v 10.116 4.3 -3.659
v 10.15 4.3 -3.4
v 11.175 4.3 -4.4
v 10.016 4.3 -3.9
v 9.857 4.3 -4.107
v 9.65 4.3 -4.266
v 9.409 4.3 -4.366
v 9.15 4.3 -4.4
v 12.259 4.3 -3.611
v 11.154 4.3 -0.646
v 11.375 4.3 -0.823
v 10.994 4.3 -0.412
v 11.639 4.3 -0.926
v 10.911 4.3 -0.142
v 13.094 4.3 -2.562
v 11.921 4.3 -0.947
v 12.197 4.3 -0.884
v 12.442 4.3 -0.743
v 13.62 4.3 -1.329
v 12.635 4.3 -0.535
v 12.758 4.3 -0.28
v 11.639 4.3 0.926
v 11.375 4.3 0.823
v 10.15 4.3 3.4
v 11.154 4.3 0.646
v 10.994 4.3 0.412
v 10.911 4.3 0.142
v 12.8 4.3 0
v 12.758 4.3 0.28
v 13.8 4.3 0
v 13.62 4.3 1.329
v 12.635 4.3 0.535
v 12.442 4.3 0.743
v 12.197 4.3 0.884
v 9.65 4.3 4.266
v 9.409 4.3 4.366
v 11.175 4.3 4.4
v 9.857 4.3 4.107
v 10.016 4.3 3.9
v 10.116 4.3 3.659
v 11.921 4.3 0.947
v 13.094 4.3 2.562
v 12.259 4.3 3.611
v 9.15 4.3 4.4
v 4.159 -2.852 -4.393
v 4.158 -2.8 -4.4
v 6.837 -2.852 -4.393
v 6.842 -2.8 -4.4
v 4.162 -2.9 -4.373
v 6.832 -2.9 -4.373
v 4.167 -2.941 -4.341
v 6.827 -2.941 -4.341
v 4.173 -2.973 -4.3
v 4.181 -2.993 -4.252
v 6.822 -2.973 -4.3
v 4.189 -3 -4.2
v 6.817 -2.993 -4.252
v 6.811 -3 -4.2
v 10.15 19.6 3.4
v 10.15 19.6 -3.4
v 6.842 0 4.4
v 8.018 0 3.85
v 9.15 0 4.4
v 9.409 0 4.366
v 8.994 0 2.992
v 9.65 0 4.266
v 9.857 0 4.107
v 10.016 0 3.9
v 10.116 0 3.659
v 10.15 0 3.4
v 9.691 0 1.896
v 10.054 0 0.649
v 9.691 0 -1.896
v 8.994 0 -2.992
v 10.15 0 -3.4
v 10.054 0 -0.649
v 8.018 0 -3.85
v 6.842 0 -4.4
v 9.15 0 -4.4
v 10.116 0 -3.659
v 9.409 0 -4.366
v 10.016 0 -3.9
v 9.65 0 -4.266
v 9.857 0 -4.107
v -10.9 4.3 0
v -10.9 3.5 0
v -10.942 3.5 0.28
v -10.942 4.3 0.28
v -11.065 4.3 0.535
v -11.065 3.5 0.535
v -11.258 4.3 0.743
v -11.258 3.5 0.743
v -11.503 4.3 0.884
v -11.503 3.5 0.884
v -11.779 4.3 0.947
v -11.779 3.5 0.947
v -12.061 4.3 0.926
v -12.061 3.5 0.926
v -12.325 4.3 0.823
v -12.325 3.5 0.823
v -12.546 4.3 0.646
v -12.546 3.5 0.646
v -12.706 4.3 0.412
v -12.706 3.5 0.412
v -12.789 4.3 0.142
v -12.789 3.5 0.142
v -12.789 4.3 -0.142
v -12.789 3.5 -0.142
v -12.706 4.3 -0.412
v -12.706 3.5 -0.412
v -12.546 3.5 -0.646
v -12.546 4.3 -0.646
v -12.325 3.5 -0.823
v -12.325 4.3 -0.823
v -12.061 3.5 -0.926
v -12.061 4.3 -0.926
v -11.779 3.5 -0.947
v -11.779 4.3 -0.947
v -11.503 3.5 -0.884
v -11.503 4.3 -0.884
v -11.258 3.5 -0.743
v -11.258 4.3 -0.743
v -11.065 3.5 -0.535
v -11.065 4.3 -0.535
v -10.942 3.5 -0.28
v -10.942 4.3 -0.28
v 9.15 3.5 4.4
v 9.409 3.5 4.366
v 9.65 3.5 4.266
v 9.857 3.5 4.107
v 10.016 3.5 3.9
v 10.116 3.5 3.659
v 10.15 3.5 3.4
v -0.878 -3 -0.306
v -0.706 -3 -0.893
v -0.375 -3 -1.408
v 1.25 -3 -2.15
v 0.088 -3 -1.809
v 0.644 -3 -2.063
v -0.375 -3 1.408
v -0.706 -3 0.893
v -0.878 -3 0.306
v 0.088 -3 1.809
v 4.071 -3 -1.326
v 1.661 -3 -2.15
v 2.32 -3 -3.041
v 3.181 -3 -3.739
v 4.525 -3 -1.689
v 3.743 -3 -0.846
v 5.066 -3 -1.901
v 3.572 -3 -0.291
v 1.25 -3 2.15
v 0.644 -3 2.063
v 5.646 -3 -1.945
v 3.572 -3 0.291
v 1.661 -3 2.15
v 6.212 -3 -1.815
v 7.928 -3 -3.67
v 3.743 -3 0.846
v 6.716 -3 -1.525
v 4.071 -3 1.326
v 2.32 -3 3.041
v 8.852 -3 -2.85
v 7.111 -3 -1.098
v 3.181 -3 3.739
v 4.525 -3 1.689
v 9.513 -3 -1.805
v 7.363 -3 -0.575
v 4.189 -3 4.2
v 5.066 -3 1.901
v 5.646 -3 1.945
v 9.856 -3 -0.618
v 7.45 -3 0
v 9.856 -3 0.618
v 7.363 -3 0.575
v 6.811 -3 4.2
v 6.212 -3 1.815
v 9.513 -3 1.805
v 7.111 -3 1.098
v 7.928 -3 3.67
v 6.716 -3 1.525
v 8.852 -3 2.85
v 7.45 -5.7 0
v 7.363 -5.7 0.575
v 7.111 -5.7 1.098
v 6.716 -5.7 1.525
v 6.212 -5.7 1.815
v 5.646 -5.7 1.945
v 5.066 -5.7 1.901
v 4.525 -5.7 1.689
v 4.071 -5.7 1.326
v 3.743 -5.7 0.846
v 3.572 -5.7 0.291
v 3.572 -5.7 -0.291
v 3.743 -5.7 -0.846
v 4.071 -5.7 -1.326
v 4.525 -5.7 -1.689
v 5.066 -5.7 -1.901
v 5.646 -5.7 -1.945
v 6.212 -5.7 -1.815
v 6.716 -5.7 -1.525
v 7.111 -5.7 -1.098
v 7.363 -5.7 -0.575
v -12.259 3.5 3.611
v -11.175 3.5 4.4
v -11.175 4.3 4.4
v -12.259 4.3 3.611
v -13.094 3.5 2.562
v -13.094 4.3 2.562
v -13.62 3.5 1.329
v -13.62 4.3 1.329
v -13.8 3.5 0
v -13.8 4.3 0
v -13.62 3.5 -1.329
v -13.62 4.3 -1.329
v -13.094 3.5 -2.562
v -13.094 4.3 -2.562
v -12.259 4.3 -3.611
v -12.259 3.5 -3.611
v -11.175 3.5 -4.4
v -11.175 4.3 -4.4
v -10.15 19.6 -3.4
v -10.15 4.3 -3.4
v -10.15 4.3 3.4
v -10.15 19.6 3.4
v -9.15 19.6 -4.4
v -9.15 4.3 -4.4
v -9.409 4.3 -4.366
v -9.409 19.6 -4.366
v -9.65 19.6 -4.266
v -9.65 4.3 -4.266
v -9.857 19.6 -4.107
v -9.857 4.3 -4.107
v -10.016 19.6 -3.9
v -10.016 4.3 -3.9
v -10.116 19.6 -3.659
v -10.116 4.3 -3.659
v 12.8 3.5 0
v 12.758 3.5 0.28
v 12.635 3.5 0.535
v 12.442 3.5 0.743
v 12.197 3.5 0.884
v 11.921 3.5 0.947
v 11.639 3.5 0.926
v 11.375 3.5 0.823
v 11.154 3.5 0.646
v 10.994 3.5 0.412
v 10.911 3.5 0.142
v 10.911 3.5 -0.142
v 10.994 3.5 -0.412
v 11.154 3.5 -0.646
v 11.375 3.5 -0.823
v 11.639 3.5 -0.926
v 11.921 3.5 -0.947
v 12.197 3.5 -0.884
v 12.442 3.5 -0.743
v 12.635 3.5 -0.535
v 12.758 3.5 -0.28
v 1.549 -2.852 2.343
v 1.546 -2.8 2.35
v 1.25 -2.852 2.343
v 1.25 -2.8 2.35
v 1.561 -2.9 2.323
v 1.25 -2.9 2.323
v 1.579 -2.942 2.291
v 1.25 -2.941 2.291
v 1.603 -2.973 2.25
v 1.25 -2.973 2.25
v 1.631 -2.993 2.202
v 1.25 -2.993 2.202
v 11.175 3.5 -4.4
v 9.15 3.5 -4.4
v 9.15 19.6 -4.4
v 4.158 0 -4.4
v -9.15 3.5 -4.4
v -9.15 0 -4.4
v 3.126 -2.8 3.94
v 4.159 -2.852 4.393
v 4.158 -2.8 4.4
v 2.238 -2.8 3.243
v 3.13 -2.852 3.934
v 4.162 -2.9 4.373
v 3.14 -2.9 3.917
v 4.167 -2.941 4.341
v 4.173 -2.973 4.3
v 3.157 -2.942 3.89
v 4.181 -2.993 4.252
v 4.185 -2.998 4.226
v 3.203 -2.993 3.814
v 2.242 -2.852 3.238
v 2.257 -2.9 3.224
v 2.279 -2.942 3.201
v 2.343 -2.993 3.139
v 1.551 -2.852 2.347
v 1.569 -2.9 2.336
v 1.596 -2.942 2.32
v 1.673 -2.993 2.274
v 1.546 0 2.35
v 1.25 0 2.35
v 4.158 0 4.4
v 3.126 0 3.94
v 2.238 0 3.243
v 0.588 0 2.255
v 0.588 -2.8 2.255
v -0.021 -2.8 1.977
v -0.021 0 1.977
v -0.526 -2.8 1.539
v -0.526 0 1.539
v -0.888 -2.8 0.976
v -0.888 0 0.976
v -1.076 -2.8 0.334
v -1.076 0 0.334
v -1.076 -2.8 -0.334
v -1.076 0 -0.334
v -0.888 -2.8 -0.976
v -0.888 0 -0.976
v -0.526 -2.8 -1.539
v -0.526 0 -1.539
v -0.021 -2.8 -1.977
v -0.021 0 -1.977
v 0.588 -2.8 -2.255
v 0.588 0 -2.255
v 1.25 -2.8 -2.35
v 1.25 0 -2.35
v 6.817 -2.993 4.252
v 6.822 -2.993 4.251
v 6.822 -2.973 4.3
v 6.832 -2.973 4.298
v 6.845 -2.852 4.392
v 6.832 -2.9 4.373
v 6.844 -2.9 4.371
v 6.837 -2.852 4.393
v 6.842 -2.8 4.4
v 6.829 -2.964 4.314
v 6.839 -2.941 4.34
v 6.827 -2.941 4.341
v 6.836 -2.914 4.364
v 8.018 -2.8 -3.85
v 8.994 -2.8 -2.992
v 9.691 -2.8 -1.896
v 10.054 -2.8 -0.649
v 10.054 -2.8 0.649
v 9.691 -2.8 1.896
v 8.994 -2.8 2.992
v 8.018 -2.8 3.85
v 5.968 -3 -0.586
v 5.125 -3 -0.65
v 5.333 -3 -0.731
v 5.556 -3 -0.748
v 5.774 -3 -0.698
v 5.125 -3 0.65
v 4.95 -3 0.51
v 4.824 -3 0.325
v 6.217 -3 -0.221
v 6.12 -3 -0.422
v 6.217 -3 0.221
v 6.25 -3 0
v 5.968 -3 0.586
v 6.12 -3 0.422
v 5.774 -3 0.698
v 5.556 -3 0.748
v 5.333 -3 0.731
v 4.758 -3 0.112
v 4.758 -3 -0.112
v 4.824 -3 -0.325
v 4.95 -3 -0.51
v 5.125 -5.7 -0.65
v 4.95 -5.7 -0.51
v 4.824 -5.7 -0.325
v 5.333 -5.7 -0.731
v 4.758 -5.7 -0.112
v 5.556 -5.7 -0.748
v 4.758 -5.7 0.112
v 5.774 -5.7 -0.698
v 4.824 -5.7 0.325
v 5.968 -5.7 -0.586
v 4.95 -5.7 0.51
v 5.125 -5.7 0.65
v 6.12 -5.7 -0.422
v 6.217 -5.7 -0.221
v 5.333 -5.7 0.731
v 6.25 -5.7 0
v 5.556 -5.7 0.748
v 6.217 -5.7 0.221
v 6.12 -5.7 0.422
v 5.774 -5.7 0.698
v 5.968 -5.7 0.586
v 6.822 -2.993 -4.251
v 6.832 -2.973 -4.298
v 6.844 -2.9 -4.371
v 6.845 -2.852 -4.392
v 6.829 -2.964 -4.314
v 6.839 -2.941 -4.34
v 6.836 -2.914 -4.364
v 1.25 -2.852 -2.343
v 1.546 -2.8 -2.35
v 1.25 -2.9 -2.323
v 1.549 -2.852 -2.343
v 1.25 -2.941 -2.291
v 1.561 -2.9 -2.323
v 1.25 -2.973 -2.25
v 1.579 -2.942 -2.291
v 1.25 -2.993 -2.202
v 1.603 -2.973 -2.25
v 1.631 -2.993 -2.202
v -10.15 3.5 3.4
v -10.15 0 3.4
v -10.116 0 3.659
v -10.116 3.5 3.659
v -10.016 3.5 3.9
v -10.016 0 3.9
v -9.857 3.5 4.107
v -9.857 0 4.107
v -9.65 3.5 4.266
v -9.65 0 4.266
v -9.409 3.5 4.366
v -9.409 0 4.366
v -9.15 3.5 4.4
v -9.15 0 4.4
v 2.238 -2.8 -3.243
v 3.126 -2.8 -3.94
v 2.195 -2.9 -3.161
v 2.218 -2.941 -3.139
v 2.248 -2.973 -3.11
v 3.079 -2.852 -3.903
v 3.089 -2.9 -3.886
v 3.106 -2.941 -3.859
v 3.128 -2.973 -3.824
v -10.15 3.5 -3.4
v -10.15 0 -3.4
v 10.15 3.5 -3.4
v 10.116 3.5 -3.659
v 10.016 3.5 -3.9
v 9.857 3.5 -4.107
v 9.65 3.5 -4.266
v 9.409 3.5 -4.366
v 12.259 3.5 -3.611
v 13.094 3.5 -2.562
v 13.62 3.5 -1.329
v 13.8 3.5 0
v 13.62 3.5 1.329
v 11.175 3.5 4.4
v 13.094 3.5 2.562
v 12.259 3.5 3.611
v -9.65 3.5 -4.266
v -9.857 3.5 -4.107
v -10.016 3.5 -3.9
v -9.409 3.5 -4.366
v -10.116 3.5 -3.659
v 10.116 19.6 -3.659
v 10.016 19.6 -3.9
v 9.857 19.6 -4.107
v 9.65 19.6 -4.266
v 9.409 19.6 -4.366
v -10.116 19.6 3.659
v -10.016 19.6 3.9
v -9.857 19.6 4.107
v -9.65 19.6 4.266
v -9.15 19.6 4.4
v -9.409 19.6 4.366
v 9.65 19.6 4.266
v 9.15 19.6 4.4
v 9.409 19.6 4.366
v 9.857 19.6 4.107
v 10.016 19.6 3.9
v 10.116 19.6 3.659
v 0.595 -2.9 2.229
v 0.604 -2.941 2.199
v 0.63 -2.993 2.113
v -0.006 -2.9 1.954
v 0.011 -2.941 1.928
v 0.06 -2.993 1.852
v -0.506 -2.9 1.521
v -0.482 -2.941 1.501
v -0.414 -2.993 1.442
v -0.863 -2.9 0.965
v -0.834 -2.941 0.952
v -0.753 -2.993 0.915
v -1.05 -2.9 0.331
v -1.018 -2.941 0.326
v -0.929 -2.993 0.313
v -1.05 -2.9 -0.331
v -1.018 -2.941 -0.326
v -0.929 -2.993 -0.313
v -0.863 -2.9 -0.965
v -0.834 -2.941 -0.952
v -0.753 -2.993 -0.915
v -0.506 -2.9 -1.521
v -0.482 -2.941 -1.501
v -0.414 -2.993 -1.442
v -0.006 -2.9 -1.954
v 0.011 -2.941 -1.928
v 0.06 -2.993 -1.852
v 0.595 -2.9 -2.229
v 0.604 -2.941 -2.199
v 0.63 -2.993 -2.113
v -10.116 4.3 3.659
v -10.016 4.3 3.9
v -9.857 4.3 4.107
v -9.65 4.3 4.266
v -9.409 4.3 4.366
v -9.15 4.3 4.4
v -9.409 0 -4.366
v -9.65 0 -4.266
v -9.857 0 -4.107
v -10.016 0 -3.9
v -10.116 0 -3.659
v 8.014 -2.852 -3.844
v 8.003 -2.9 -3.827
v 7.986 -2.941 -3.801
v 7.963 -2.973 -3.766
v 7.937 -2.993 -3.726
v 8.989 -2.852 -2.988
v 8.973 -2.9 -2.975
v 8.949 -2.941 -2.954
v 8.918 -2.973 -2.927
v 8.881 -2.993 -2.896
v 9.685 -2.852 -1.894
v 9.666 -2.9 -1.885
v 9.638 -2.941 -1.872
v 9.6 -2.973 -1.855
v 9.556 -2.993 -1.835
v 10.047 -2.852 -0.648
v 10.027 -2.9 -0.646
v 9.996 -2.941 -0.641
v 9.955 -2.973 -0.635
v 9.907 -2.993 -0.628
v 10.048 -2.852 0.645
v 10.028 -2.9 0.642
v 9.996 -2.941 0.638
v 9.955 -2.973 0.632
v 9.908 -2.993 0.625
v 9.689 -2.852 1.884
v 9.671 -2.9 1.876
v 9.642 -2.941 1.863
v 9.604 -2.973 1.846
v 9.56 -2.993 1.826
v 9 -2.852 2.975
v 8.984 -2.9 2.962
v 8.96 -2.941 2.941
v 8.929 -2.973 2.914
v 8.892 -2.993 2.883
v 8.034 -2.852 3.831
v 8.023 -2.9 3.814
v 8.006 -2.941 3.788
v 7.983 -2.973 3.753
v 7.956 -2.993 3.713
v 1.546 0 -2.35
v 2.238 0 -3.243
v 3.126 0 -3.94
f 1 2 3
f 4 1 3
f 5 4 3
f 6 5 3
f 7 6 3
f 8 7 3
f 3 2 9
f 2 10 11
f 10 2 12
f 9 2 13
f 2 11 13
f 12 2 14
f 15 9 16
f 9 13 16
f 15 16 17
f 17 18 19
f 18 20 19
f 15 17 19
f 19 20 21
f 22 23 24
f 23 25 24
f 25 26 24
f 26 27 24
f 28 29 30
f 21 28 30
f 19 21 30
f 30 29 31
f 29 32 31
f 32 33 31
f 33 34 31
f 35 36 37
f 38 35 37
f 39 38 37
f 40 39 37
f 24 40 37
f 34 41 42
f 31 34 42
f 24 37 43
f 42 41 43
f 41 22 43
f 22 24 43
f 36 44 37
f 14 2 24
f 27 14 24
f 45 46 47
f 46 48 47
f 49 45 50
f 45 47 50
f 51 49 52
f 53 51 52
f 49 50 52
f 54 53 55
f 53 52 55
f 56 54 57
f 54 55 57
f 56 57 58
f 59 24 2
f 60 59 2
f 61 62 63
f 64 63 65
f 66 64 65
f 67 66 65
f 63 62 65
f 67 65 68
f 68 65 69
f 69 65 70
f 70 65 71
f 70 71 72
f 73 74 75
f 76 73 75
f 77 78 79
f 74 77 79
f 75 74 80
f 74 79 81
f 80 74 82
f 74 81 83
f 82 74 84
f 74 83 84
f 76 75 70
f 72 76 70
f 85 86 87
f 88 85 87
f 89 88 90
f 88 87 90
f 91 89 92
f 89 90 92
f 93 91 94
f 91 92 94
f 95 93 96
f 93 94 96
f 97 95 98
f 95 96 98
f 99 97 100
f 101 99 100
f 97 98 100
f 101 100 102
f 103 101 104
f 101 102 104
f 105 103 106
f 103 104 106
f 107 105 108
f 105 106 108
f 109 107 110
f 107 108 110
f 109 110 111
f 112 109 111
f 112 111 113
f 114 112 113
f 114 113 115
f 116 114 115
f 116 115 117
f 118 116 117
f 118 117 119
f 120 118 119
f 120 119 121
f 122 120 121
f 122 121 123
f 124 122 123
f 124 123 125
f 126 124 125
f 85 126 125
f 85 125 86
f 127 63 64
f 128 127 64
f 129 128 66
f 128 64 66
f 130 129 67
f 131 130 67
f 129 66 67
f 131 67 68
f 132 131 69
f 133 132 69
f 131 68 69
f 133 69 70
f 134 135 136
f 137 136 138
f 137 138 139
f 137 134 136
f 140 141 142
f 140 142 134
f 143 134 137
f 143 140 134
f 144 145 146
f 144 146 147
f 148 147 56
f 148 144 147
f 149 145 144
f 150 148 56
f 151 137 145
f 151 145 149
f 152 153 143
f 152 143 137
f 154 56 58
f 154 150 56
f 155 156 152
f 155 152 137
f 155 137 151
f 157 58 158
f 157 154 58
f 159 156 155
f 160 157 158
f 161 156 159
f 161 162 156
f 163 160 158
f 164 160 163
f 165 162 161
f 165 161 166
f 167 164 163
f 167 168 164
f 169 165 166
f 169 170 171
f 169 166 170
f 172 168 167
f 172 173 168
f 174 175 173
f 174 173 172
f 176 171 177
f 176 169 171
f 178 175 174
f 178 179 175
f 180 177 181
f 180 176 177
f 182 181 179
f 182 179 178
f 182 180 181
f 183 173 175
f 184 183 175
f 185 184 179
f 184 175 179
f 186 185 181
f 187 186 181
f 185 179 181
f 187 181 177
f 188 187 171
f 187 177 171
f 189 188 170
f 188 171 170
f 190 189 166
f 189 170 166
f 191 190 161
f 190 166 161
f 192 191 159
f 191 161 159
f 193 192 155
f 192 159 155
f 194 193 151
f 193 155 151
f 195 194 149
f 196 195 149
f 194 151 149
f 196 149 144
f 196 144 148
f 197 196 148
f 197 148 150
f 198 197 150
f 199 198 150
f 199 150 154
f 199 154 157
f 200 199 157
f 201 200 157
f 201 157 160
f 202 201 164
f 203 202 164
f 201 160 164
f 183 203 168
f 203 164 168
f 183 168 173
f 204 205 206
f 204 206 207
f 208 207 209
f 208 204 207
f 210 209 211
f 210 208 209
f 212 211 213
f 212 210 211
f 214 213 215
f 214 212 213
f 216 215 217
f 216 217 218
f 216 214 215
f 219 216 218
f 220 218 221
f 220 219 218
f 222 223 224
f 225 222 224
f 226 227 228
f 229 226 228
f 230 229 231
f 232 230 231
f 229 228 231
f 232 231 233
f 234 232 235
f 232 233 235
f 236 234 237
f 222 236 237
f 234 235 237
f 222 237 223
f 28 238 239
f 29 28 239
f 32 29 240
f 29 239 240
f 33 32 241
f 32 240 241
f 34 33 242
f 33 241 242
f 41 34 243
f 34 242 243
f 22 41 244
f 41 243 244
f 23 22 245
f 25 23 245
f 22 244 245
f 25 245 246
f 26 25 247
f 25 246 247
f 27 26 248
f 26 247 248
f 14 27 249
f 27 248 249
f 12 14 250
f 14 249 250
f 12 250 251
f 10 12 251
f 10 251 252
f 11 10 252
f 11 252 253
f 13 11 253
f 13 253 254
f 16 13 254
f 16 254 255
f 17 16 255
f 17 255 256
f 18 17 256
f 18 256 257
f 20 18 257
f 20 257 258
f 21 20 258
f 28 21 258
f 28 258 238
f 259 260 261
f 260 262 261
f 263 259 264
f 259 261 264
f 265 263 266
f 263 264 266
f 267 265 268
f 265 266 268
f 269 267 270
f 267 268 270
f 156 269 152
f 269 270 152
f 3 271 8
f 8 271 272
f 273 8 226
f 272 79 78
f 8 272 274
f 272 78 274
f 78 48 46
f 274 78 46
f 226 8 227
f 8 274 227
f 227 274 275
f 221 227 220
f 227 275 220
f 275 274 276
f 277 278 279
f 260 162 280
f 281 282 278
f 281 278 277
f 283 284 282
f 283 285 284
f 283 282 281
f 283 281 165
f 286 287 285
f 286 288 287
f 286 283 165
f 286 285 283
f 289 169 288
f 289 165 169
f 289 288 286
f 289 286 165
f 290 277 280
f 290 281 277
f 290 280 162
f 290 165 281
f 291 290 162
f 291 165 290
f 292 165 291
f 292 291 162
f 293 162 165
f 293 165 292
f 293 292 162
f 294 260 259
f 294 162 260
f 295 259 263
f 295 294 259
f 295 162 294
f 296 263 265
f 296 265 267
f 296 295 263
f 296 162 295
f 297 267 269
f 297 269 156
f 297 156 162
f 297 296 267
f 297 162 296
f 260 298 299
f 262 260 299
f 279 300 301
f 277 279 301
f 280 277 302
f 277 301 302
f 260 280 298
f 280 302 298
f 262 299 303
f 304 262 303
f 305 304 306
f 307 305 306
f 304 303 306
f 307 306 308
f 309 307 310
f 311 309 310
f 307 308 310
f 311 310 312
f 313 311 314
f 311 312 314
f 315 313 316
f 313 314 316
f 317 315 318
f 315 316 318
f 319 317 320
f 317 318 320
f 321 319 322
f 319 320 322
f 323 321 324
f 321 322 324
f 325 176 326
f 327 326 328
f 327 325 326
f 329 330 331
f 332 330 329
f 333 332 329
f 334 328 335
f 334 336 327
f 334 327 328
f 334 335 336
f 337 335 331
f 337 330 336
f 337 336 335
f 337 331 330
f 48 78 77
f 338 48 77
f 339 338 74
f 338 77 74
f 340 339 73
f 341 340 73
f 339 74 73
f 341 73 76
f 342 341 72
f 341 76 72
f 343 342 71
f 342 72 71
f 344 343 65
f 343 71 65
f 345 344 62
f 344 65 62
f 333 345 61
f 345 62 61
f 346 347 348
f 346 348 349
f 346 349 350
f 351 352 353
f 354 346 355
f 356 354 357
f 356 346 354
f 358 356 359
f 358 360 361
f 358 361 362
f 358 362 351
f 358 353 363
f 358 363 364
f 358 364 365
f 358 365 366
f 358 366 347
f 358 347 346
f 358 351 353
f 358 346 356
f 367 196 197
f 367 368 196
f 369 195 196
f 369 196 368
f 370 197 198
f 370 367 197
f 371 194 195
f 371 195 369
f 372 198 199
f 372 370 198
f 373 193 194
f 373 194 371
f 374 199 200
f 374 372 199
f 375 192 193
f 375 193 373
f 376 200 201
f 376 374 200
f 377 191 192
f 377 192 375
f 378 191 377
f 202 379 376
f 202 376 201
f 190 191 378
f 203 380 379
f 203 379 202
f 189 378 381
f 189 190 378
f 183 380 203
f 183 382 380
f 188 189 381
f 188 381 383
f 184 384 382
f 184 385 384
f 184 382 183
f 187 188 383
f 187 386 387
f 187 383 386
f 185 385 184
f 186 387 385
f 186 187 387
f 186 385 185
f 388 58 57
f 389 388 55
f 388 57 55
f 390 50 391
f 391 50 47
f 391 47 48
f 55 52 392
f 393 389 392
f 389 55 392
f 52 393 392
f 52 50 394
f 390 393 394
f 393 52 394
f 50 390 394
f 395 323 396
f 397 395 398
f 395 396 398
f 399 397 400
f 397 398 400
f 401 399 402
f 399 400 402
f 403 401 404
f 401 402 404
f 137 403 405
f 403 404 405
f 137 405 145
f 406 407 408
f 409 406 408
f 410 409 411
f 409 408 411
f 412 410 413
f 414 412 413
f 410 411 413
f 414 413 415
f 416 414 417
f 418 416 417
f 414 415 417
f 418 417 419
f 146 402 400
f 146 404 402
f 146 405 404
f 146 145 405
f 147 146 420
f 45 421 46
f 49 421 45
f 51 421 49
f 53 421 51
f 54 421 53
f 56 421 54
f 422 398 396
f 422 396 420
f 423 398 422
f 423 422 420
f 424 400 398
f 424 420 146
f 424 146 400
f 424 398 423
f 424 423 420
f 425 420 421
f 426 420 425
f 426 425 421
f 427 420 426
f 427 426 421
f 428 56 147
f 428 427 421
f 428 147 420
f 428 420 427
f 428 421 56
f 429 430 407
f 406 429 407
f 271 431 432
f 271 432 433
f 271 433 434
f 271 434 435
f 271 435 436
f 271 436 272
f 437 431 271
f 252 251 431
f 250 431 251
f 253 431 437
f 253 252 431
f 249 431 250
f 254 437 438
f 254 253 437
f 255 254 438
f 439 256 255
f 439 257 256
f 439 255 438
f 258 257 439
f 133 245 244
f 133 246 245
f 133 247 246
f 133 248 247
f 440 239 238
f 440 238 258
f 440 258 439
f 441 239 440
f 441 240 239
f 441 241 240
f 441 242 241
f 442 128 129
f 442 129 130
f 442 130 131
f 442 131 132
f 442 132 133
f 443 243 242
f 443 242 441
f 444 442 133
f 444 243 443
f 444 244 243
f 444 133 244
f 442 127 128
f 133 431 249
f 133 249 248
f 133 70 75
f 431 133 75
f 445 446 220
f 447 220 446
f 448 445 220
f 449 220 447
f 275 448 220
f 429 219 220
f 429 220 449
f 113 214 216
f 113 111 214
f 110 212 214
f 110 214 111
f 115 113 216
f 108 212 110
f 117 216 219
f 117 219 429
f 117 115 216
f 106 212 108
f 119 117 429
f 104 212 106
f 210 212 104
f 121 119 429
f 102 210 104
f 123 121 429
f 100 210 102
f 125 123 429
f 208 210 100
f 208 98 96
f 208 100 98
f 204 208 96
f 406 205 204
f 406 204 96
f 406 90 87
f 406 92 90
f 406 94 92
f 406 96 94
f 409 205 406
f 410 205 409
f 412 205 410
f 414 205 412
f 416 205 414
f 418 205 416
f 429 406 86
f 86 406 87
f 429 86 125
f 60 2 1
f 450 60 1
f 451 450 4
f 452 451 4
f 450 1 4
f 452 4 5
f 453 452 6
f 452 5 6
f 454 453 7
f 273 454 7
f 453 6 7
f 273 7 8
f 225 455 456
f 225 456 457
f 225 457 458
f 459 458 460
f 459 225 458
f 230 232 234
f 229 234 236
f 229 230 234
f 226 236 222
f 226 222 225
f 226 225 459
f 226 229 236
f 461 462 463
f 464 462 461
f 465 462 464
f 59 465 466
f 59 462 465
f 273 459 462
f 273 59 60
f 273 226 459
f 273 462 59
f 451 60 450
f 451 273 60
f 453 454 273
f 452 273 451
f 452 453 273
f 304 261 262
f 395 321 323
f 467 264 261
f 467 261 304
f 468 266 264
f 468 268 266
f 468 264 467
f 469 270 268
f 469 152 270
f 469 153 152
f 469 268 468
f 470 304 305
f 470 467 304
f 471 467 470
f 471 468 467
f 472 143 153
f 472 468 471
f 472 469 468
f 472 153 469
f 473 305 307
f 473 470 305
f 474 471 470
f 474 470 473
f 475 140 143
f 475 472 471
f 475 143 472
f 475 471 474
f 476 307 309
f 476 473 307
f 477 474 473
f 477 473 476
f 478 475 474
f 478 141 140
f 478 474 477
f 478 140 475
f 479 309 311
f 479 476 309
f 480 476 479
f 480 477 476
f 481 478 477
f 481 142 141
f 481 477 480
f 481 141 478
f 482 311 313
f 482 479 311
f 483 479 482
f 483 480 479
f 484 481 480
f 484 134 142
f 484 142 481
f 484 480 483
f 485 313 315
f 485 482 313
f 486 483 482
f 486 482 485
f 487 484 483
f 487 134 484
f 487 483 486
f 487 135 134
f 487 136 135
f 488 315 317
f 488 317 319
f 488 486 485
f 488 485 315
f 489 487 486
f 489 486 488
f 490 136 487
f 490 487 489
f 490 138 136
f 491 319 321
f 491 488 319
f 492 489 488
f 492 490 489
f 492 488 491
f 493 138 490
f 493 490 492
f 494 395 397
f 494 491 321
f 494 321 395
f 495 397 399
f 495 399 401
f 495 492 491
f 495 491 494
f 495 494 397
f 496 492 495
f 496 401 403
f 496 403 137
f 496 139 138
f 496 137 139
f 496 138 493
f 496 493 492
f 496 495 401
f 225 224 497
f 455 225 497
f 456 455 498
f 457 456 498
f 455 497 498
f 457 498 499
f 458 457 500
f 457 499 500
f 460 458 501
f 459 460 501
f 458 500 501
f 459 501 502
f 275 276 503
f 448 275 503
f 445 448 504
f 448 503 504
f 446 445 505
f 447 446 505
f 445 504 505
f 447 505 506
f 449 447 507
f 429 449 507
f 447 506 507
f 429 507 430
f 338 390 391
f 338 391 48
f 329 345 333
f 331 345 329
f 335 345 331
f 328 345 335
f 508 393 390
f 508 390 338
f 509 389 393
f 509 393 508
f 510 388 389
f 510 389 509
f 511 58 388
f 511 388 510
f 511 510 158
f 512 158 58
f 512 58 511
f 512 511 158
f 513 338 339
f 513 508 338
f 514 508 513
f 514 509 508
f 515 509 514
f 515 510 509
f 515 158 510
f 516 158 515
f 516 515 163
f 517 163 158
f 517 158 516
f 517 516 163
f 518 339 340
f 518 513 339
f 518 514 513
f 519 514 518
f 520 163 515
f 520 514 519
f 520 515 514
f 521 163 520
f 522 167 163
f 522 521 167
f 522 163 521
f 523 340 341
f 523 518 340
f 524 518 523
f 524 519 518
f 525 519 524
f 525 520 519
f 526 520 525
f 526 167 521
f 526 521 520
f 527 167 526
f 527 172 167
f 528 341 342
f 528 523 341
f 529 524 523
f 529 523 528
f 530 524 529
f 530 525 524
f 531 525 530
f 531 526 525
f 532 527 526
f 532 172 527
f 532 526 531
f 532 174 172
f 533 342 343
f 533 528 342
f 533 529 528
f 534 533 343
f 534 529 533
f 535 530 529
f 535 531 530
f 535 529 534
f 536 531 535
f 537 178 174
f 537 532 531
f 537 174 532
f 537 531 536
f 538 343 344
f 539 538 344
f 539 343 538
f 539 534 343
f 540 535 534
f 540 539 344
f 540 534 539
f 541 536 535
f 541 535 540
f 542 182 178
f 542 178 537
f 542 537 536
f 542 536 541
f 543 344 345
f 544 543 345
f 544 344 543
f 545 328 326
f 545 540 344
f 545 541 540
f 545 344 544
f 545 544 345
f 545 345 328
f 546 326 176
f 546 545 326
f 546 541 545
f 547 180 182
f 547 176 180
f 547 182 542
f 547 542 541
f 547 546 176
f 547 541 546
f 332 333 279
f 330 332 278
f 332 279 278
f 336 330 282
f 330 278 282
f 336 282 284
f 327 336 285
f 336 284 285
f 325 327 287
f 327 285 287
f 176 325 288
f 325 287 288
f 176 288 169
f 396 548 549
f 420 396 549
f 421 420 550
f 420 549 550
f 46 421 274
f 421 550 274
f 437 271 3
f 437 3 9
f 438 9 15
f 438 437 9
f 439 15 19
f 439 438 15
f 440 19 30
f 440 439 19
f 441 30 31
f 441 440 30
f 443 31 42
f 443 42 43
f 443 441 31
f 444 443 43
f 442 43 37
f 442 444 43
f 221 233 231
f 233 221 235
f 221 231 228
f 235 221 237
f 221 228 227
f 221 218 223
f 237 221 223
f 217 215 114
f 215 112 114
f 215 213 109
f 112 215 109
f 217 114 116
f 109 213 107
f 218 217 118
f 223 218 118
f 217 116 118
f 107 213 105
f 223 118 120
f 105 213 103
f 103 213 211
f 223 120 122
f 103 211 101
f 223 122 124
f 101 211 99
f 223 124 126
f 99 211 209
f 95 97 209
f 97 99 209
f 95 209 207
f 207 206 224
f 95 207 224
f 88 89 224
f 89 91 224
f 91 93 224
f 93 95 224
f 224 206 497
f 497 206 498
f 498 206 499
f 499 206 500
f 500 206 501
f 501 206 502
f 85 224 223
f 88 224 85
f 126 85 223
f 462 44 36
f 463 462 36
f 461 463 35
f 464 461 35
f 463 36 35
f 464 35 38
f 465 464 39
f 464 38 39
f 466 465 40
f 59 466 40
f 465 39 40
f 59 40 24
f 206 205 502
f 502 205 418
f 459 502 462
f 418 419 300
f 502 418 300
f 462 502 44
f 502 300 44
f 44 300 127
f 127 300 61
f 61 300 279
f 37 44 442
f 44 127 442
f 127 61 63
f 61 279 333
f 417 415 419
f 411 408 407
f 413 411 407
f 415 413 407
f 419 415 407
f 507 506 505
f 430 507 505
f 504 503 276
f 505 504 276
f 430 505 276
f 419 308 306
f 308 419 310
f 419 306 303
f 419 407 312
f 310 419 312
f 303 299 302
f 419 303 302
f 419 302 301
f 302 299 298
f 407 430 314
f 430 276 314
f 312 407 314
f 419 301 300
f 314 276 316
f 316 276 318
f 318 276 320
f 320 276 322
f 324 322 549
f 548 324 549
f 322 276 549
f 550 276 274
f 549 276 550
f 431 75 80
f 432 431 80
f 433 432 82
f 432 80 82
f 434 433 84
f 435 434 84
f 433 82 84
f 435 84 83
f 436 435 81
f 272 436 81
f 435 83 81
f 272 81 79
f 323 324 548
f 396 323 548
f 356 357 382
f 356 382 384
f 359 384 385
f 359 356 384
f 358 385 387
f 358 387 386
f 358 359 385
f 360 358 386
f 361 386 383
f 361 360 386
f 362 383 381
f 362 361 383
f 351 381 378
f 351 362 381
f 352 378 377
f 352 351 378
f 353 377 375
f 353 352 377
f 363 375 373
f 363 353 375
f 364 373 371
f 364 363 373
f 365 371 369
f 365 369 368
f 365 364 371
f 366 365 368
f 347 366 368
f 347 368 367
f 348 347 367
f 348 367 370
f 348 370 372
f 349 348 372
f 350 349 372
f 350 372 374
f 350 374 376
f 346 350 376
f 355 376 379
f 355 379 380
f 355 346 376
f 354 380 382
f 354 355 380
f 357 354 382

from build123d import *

# Parameters (mm, degrees)
EXTRUDE_1_DEPTH     = 19.6
EXTRUDE_START       = -3.5
EXTRUDE_2_DEPTH     = 0.8
EXTRUDE_3_DEPTH     = 3
FILLET_1_R          = 0.2
SKETCH_4_R          = 1.95
SKETCH_4_R_2        = 0.75
EXTRUDE_4_DEPTH     = 2.7
CUT_EXTRUDE_1_REACH = 18.1
SKETCH_5_R          = 0.95


with BuildPart() as part:
    # Эскиз1 → Бобышка-Вытянуть1 (new body)
    with BuildSketch(Plane(origin=(0, 0, 0), x_dir=(1, 0, 0), z_dir=(0, 1, 0))):
        with BuildLine():
            Line((-9.15, -4.4), (9.15, -4.4))
            ThreePointArc((9.15, -4.4), (9.857106781, -4.107106781), (10.15, -3.4))
            Line((10.15, -3.4), (10.15, 3.4))
            ThreePointArc((10.15, 3.4), (9.857106781, 4.107106781), (9.15, 4.4))
            Line((9.15, 4.4), (-9.15, 4.4))
            ThreePointArc((-9.15, 4.4), (-9.857106781, 4.107106781), (-10.15, 3.4))
            Line((-10.15, 3.4), (-10.15, -3.4))
            ThreePointArc((-10.15, -3.4), (-9.857106781, -4.107106781), (-9.15, -4.4))
        make_face()
    extrude(amount=EXTRUDE_1_DEPTH)

    # Эскиз2 → Бобышка-Вытянуть2 (add)
    with BuildSketch(Plane.XZ.offset(EXTRUDE_START)):
        with BuildLine():
            Line((-9.15, 4.4), (-11.174868417, 4.4))
            ThreePointArc((-11.174868417, 4.4), (-13.8, 0), (-11.174868417, -4.4))
            Line((-11.174868417, -4.4), (-9.15, -4.4))
            ThreePointArc((-9.15, -4.4), (-9.857106781, -4.107106781), (-10.15, -3.4))
            Line((-10.15, -3.4), (-10.15, 3.4))
            ThreePointArc((-10.15, 3.4), (-9.857106781, 4.107106781), (-9.15, 4.4))
        make_face()
        with BuildLine():
            Line((11.174868417, 4.4), (9.15, 4.4))
            ThreePointArc((9.15, 4.4), (9.857106781, 4.107106781), (10.15, 3.4))
            Line((10.15, 3.4), (10.15, -3.4))
            ThreePointArc((10.15, -3.4), (9.857106781, -4.107106781), (9.15, -4.4))
            Line((9.15, -4.4), (11.174868417, -4.4))
            ThreePointArc((11.174868417, -4.4), (13.8, 0), (11.174868417, 4.4))
        make_face()
    extrude(amount=-EXTRUDE_2_DEPTH)

    # Эскиз3 → Бобышка-Вытянуть3 (add)
    with BuildSketch(Plane.XZ):
        with BuildLine():
            ThreePointArc((4.158359214, 4.4), (2.660508694, 3.619017701), (1.545572102, 2.35))
            Line((1.545572102, 2.35), (1.25, 2.35))
            ThreePointArc((1.25, 2.35), (-1.1, 0), (1.25, -2.35))
            Line((1.25, -2.35), (1.545572102, -2.35))
            ThreePointArc((1.545572102, -2.35), (2.660508694, -3.619017701), (4.158359214, -4.4))
            Line((4.158359214, -4.4), (6.841640786, -4.4))
            ThreePointArc((6.841640786, -4.4), (10.1, 0), (6.841640786, 4.4))
            Line((6.841640786, 4.4), (4.158359214, 4.4))
        make_face()
    extrude(amount=EXTRUDE_3_DEPTH)

    # Скругление1
    fillet_1_edges = [part.edges().sort_by_distance(p)[0] for p in [
        (-1.1, -3, 0),
        (2.660508694, -3, -3.619017701),
        (5.5, -3, -4.4),
        (10.1, -3, 0),
        (5.5, -3, 4.4),
        (2.660508694, -3, 3.619017701),
        (1.397786051, -3, -2.35),
        (1.397786051, -3, 2.35),
    ]]
    fillet(fillet_1_edges, radius=FILLET_1_R)

    # Эскиз4 → Бобышка-Вытянуть4 (add)
    with BuildSketch(Plane.XZ.offset(3)):
        with Locations((5.5, 0)):
            Circle(SKETCH_4_R)
        with Locations((5.5, 0)):
            Circle(SKETCH_4_R_2, mode=Mode.SUBTRACT)
    extrude(amount=EXTRUDE_4_DEPTH)

    # Эскиз5 → Вырез-Вытянуть1 (cut, up to next)
    with BuildSketch(Plane.XZ.offset(-3.5), mode=Mode.PRIVATE) as cut_extrude_1_sk1:
        with Locations((-11.85, 0)):
            Circle(SKETCH_5_R)
    cut_extrude_1_tool1 = extrude(cut_extrude_1_sk1.sketch, amount=-CUT_EXTRUDE_1_REACH, mode=Mode.PRIVATE) & part.part
    add(cut_extrude_1_tool1.solids().sort_by_distance((-11.85, 3.5, 0))[0], mode=Mode.SUBTRACT)
    # Эскиз5 → Вырез-Вытянуть1 (cut, up to next)
    with BuildSketch(Plane.XZ.offset(-3.5), mode=Mode.PRIVATE) as cut_extrude_1_sk2:
        with Locations((11.85, 0)):
            Circle(SKETCH_5_R)
    cut_extrude_1_tool2 = extrude(cut_extrude_1_sk2.sketch, amount=-CUT_EXTRUDE_1_REACH, mode=Mode.PRIVATE) & part.part
    add(cut_extrude_1_tool2.solids().sort_by_distance((11.85, 3.5, 0))[0], mode=Mode.SUBTRACT)


solid = part.part
